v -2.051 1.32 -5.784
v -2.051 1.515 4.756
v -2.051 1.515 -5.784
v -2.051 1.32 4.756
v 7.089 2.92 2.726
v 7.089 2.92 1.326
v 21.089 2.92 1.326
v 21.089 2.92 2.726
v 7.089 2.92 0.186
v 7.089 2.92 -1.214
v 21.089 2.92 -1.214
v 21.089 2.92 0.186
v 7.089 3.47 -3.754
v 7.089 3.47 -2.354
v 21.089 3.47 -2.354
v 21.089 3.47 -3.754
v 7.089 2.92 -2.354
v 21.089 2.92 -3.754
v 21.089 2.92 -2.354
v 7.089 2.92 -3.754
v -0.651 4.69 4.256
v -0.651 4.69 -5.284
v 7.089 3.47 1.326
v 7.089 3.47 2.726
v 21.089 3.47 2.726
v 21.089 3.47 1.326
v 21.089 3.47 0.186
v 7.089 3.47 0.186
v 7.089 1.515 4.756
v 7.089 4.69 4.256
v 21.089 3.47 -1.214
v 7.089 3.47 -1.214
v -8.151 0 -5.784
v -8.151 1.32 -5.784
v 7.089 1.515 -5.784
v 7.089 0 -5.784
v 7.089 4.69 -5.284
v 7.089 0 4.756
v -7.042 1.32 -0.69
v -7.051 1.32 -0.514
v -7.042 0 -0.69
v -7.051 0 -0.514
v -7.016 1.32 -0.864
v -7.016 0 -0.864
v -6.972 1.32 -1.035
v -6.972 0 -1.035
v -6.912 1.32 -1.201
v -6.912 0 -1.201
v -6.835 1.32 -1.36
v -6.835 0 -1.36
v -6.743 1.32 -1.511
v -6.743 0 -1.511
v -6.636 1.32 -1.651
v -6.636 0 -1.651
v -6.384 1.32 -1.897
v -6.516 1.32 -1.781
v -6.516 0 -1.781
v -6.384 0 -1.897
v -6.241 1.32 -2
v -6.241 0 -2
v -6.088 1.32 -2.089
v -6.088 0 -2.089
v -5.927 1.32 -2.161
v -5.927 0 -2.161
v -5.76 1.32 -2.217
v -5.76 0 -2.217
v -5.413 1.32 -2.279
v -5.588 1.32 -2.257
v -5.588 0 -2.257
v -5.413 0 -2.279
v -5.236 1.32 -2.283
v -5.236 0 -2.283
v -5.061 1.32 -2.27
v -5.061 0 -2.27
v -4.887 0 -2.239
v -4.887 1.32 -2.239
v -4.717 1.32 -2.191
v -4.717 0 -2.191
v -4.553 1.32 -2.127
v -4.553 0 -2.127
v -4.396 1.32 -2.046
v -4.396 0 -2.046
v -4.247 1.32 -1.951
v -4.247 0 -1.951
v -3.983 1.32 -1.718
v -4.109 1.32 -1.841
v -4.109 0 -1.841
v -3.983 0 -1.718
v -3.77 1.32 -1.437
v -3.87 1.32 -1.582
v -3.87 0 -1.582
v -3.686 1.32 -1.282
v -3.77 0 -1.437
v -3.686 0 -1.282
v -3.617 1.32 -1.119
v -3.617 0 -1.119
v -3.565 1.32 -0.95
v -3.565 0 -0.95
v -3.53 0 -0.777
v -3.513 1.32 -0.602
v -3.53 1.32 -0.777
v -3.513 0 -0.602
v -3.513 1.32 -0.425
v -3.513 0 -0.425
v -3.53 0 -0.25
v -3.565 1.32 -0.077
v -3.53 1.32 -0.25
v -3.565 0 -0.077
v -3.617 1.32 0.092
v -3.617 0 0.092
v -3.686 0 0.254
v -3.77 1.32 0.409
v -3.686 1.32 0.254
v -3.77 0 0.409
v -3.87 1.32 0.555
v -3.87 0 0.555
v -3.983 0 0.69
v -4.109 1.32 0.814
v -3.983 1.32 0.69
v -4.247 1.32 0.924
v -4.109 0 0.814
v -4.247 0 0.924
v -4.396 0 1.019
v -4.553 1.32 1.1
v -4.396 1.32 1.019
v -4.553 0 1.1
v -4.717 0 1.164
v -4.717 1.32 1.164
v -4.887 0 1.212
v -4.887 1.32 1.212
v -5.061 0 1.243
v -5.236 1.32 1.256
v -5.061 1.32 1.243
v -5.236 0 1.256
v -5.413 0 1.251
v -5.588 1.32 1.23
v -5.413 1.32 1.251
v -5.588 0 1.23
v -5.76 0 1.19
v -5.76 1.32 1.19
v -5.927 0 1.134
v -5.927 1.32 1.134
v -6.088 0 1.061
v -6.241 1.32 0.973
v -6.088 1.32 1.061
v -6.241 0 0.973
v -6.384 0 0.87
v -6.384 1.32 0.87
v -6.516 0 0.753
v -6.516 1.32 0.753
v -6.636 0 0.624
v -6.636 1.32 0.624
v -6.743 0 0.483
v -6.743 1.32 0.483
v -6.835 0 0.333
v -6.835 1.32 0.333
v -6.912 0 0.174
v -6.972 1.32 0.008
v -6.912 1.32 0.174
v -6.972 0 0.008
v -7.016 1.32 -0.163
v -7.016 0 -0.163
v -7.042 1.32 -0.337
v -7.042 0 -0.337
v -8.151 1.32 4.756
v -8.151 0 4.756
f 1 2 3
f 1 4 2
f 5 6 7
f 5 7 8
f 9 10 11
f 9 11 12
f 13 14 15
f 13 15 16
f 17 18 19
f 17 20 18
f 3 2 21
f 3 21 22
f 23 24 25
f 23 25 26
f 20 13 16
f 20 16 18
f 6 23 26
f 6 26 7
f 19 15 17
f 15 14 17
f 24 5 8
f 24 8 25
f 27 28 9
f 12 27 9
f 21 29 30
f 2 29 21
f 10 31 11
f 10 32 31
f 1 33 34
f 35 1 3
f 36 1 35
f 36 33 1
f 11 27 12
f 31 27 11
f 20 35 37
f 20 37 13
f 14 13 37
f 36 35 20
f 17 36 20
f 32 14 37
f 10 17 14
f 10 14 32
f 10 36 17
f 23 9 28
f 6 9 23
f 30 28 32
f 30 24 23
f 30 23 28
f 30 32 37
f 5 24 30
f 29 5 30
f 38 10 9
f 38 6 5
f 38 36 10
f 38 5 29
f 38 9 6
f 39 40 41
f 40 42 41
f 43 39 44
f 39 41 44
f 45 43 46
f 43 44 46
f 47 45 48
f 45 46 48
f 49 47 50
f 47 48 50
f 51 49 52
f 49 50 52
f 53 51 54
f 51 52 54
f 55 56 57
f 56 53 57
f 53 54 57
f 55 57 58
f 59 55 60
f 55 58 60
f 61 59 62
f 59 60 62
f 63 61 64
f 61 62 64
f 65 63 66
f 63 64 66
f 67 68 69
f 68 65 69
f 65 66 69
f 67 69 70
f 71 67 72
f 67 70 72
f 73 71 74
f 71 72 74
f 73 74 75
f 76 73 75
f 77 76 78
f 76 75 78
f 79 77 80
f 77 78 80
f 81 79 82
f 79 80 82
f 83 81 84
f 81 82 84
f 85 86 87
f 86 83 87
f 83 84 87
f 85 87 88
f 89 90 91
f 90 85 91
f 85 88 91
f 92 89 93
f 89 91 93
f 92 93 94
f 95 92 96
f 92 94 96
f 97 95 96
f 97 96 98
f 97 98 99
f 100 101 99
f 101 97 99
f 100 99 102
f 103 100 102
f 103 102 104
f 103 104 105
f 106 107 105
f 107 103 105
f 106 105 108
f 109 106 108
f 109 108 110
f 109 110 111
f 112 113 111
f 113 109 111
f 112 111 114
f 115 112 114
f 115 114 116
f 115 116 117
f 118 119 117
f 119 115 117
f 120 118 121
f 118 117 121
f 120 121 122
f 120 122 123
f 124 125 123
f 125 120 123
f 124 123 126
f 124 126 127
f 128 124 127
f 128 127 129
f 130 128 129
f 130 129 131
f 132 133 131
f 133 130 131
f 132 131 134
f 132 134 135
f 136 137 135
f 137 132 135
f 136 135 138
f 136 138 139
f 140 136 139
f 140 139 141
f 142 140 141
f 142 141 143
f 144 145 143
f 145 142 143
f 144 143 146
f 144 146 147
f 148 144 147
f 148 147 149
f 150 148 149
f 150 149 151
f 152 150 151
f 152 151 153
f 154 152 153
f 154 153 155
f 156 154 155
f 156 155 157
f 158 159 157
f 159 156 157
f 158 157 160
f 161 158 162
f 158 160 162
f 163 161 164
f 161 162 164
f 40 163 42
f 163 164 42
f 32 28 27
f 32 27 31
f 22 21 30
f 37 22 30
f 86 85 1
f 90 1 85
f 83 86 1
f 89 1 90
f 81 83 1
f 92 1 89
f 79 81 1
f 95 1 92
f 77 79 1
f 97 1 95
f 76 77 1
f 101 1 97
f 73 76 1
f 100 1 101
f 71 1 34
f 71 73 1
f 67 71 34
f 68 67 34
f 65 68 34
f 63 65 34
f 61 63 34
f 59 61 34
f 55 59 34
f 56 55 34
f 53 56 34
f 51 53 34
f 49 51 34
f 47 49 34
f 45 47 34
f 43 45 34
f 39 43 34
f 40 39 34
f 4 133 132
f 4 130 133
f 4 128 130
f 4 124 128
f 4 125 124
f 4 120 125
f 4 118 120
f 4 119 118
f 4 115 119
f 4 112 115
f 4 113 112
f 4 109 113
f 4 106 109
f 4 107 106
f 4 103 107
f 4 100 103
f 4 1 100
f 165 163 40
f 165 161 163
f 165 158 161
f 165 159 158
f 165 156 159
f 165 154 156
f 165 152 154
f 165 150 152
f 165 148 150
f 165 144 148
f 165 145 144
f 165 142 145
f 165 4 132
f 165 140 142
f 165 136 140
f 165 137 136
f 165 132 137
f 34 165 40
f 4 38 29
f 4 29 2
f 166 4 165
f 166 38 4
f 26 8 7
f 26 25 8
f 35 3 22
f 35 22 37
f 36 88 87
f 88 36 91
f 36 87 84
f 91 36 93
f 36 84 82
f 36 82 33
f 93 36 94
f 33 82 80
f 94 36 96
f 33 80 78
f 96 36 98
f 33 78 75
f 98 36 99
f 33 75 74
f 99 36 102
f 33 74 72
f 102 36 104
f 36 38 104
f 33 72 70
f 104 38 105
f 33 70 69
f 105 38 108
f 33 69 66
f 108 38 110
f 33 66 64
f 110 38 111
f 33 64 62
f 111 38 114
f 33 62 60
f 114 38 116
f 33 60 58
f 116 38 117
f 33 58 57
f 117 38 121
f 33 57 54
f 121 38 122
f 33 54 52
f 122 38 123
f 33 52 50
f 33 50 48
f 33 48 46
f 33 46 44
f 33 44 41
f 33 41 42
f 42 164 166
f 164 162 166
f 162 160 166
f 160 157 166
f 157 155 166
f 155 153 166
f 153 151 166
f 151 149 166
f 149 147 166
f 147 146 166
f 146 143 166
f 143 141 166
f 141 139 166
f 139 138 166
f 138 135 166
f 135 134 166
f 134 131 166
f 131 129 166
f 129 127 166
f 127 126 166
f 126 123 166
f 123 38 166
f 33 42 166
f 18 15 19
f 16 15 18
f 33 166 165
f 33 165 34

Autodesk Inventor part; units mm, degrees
ref_plane "YZ Plane" through (0, 0, 0) normal (1, 0, 0) x (0, 1, 0)
ref_plane "XZ Plane" through (0, 0, 0) normal (0, 1, 0) x (-1, 0, 0)
ref_plane "XY Plane" through (0, 0, 0) normal (0, 0, 1) x (1, 0, 0)
sketch "Sketch1" plane through (0, 0, 0) normal (0, 1, 0) x (-1, 0, 0)
  line L0 (-7.0894, 4.7564) -> (8.1506, 4.7564)
  line L1 (8.1506, 4.7564) -> (8.1506, -5.7836)
  line L2 (8.1506, -5.7836) -> (-7.0894, -5.7836)
  line L3 (-7.0894, -5.7836) -> (-7.0894, 4.7564)
  circle A0 centre (5.2806, -0.5136) radius 1.77
  point P0 (0, 0)
  dimension "d0" = 10.54
  dimension "d1" = 15.24
  dimension "d2" = 3.54
  dimension "d3" = 2.87
  dimension "d4" = 5.27
extrude "Extrusion1" add sketch "Sketch1" along normal blind 1.32
sketch "Sketch2" plane through (0, 1.32, 0) normal (0, 1, 0) x (1, 0, 0)
  line L0 (7.0894, 5.7836) -> (-8.1506, 5.7836) projected
  line L1 (-2.0506, 5.7836) -> (7.0894, 5.7836)
  line L2 (7.0894, 5.7836) -> (7.0894, -4.7564)
  line L3 (7.0894, -4.7564) -> (-2.0506, -4.7564)
  line L4 (-2.0506, -4.7564) -> (-2.0506, 5.7836)
  point P0 (0, 0)
  dimension "d7" = 9.14
extrude "Extrusion2" add sketch "Sketch2" along normal blind 3.37
chamfer "Chamfer1" distance 1.4 distance2 3.175 1 edges at (-2.0506, 4.69, -0.5136) measured on face at (0.996, 4.69, -2.2703)
chamfer "Chamfer2" distance 0.5 distance2 3.175 1 edges at (3.2194, 4.69, -5.7836) measured on face at (1.9294, 4.69, -2.2703)
chamfer "Chamfer3" distance 0.5 distance2 3.175 1 edges at (3.2194, 4.69, 4.7564) measured on face at (1.9294, 4.69, -1.9369)
sketch "Sketch4" plane through (7.0894, 0, 4.7564) normal (1, 0, 0) x (0, 0, -1)
  line L0 (0, 0) -> (0, 1.515) projected
  line L1 (10.54, 0) -> (0, 0) projected
  line L2 (2.03, 3.47) -> (8.51, 3.47)
  line L3 (8.51, 3.47) -> (8.51, 2.92)
  line L4 (8.51, 2.92) -> (2.03, 2.92)
  line L5 (2.03, 2.92) -> (2.03, 3.47)
  line L6 (3.43, 3.47) -> (3.43, 2.92)
  line L7 (4.57, 3.47) -> (4.57, 2.92)
  line L8 (5.97, 3.47) -> (5.97, 2.92)
  line L9 (7.11, 3.47) -> (7.11, 2.92)
  point P0 (4.7564, 0)
  dimension "d19" = 0.55
  dimension "d20" = 2.92
  dimension "d21" = 6.48
  dimension "d22" = 1.4
  dimension "d23" = 1.4
  dimension "d24" = 1.4
  dimension "d25" = 2.54
  dimension "d26" = 4.57
extrude "Extrusion3" add sketch "Sketch4" along normal blind 14 contours L2 L6 L4 L5 | L2 L8 L4 L7 | L2 L3 L4 L9
properties part number "MOSFET"
